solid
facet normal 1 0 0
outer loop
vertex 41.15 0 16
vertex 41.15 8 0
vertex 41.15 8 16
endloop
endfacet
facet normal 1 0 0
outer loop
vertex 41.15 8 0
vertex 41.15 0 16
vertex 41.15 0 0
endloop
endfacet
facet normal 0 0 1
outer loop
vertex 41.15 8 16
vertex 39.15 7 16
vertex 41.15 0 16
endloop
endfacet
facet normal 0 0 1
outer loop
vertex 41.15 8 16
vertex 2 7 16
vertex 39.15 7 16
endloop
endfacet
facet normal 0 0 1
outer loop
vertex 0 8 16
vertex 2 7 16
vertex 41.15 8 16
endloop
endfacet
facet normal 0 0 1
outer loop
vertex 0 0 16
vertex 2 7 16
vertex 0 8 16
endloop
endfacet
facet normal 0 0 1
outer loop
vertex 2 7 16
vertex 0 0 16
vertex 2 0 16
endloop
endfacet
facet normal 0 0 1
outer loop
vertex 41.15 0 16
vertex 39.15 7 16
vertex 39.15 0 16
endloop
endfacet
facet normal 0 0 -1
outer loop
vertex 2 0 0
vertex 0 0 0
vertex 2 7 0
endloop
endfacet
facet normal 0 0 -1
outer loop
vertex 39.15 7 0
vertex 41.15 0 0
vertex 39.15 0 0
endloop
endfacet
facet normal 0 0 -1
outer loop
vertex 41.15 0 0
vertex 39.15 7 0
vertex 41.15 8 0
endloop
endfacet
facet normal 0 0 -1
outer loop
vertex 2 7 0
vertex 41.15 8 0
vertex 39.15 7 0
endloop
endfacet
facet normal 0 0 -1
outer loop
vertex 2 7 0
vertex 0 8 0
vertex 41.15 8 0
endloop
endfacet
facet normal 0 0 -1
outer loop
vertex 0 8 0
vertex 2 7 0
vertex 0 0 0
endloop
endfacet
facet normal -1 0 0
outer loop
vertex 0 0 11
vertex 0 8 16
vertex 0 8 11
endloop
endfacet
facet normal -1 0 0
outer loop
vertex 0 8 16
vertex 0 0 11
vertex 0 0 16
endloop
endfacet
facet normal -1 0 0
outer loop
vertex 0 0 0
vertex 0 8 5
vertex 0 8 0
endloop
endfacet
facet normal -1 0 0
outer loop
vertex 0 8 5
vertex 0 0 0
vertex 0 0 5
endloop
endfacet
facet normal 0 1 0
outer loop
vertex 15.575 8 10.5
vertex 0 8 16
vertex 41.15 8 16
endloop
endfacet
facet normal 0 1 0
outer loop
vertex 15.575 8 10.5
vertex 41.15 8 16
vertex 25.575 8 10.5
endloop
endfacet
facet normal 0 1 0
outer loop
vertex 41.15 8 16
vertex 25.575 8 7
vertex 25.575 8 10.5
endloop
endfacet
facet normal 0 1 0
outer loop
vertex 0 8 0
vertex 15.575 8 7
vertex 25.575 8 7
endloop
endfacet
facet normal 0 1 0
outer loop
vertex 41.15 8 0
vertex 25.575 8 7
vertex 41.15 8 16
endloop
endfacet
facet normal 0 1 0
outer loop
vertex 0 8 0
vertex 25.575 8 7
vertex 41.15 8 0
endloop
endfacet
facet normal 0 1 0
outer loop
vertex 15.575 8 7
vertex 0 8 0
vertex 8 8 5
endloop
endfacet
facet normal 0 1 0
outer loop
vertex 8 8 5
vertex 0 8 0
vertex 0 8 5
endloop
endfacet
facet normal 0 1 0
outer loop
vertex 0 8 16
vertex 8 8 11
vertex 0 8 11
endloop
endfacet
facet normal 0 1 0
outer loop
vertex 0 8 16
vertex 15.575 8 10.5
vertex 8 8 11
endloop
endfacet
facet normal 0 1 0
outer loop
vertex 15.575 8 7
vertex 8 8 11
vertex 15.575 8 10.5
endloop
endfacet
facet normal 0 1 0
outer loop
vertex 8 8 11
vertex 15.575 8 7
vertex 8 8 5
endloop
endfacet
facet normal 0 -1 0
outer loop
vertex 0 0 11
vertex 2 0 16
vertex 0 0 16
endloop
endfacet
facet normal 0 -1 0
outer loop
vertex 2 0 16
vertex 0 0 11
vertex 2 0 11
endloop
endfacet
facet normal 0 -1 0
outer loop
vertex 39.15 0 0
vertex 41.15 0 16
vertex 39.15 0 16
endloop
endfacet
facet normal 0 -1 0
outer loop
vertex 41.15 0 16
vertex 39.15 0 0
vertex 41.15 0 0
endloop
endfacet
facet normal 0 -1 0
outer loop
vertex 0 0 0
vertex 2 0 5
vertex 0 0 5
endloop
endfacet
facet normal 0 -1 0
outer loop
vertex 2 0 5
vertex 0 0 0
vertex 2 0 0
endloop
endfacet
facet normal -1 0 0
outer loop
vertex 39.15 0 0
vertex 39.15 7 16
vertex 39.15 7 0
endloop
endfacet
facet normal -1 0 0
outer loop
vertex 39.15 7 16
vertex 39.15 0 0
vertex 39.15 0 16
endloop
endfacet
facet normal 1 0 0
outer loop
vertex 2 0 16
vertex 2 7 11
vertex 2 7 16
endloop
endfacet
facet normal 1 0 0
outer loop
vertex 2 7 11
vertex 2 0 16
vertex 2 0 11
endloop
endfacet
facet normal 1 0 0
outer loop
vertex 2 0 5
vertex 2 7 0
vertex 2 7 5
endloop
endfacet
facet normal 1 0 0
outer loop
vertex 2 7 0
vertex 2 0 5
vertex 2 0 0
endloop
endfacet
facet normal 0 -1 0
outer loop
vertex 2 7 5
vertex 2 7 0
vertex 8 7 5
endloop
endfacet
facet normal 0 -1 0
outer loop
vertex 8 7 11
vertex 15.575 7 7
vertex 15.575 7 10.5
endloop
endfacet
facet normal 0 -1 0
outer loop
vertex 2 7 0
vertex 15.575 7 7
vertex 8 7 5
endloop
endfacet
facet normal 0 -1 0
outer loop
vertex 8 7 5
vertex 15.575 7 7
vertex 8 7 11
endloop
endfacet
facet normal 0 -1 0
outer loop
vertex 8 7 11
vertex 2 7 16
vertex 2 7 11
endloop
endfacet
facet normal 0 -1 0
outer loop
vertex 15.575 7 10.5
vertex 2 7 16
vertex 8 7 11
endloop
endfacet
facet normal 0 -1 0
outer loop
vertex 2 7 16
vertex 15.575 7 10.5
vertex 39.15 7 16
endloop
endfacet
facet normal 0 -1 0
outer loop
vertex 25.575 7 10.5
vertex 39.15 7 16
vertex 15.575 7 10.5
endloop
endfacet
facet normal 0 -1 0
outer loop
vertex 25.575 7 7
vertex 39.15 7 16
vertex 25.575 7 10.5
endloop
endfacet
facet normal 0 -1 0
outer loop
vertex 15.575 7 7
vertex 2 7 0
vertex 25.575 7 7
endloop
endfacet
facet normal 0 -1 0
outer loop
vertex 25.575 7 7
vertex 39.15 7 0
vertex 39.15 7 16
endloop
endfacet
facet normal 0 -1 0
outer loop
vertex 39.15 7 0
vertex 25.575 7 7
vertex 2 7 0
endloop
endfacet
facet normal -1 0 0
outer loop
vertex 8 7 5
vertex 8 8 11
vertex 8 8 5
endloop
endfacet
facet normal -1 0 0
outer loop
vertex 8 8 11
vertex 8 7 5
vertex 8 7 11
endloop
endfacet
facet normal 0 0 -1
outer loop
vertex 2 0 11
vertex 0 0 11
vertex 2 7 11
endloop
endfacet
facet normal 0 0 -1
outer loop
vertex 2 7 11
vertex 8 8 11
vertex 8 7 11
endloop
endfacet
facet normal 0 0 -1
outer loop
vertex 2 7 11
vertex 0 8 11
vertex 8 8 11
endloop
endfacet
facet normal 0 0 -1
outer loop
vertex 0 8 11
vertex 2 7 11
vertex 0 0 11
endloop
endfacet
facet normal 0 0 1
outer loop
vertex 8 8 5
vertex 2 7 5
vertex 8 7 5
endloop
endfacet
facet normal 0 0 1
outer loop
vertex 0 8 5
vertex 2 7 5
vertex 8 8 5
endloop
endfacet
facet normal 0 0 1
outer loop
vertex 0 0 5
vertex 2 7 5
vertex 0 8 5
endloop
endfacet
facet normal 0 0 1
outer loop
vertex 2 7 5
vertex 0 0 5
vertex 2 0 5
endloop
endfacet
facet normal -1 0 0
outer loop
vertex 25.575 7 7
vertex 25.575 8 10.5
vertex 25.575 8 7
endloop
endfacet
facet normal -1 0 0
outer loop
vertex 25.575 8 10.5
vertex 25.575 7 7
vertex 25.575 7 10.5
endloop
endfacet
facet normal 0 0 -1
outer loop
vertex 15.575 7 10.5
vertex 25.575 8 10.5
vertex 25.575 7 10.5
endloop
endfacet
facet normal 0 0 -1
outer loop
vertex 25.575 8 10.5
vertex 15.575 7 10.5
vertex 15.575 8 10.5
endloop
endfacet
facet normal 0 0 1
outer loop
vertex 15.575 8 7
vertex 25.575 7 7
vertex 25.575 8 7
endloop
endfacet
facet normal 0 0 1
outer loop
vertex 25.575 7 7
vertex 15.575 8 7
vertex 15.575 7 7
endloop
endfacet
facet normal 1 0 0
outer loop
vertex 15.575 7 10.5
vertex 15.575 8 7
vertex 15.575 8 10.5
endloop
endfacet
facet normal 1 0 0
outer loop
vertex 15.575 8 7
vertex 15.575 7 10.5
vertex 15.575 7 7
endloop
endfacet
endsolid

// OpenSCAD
// file: vars.scad
$fs = 0.1;

mm = 1.0;
inch = 25.4;

rows = 5;
board_cols = 15;
hand_cols = 6;
center_cols = board_cols - 2 * hand_cols;

key_width = 0.75 * inch;
key_height = 0.75 * inch;

keyway_height = key_height * rows;
board_keyway_width = key_width * board_cols;
hand_keyway_width = key_width * hand_cols;
center_cover_width = key_width * center_cols;

plate_margin = 8 * mm;

plate_height = keyway_height + 2 * plate_margin;
board_plate_width = board_keyway_width + 2 * plate_margin;
hand_plate_width = hand_keyway_width + plate_margin; // margin only on outer edge

plate_corner_radius = 2 * mm;

mount_bottom = 0.5 * plate_margin;
mount_vcenter = 0.5 * plate_height;
mount_top = plate_height - 0.5 * plate_margin;

mount_left = 0.5 * plate_margin;
mount_hand_hcenter = 0.5 * hand_plate_width;
mount_hand_right = hand_plate_width - 0.5 * plate_margin;
mount_board_hcenter = 0.5 * board_plate_width;
mount_board_right = board_plate_width - 0.5 * plate_margin;

plate_thickness = 3 * mm;
case_depth = 10 * mm;

plate_color = [ 0, 0, 0, 0.2 ]; // rgba

center_cover_mounting_inset = 0.15 * inch;

case_overhang = 2 * mm;
hand_case_width = hand_plate_width + case_overhang + plate_margin;
middle_shell_bridge_height = 6 * mm;
case_height = plate_height + 2 * case_overhang;
top_shell_height = 8 * mm;
thread_depth = 6 * mm;
shell_chamfer = 2 * mm;
middle_shell_standoff_height = 8 * mm;
middle_shell_total_height = middle_shell_standoff_height + plate_thickness;
shell_center_lip = 2 * mm;
bottom_shell_thickness = 3 * mm;
bottom_shell_screw_recess = 2 * mm;
bottom_shell_skuf_inset = 8 * mm;
bottom_shell_joint_width = 2 * mm;
bottom_shell_joint_skew = 1 * mm;
bottom_shell_width = hand_plate_width + case_overhang + 0.5 * center_cover_width + 0.5 * bottom_shell_joint_width;

front_cover_width = center_cover_width - 2 * plate_margin;
front_cover_height = middle_shell_total_height + top_shell_height - plate_thickness;
front_cover_depth = plate_margin;

rear_cover_thickness = 1 * mm;

skuf_width = 42.0 * mm;
skuf_height = 6.0 * mm;
skuf_depth = 0.5 * mm;
// main file
include <vars.scad>

switch_cutout_position = [ -0.01, -0.01, 5 ] * mm;
switch_cutout_size = [ 8.01 * mm, front_cover_depth + 0.02 * mm, 6 * mm ];

usb_cutout_size = [ 10 * mm, front_cover_depth + 0.02 * mm, 3.5 * mm ];
usb_cutout_position = [ (front_cover_width - usb_cutout_size[0]) / 2, -0.01 * mm, 7 * mm ];

module rear_cover_piccolo()
{
    difference()
    {
        cube([ front_cover_width, front_cover_depth, front_cover_height ]);

        translate([ shell_center_lip, -0.01 * mm, -0.01 * mm ]) cube([
            front_cover_width - 2 * shell_center_lip, front_cover_depth - rear_cover_thickness + 0.01 * mm,
            front_cover_height + 0.02 *
            mm
        ]);

        translate(switch_cutout_position) cube(switch_cutout_size);
        translate(usb_cutout_position) cube(usb_cutout_size);
    }
}

rear_cover_piccolo();
